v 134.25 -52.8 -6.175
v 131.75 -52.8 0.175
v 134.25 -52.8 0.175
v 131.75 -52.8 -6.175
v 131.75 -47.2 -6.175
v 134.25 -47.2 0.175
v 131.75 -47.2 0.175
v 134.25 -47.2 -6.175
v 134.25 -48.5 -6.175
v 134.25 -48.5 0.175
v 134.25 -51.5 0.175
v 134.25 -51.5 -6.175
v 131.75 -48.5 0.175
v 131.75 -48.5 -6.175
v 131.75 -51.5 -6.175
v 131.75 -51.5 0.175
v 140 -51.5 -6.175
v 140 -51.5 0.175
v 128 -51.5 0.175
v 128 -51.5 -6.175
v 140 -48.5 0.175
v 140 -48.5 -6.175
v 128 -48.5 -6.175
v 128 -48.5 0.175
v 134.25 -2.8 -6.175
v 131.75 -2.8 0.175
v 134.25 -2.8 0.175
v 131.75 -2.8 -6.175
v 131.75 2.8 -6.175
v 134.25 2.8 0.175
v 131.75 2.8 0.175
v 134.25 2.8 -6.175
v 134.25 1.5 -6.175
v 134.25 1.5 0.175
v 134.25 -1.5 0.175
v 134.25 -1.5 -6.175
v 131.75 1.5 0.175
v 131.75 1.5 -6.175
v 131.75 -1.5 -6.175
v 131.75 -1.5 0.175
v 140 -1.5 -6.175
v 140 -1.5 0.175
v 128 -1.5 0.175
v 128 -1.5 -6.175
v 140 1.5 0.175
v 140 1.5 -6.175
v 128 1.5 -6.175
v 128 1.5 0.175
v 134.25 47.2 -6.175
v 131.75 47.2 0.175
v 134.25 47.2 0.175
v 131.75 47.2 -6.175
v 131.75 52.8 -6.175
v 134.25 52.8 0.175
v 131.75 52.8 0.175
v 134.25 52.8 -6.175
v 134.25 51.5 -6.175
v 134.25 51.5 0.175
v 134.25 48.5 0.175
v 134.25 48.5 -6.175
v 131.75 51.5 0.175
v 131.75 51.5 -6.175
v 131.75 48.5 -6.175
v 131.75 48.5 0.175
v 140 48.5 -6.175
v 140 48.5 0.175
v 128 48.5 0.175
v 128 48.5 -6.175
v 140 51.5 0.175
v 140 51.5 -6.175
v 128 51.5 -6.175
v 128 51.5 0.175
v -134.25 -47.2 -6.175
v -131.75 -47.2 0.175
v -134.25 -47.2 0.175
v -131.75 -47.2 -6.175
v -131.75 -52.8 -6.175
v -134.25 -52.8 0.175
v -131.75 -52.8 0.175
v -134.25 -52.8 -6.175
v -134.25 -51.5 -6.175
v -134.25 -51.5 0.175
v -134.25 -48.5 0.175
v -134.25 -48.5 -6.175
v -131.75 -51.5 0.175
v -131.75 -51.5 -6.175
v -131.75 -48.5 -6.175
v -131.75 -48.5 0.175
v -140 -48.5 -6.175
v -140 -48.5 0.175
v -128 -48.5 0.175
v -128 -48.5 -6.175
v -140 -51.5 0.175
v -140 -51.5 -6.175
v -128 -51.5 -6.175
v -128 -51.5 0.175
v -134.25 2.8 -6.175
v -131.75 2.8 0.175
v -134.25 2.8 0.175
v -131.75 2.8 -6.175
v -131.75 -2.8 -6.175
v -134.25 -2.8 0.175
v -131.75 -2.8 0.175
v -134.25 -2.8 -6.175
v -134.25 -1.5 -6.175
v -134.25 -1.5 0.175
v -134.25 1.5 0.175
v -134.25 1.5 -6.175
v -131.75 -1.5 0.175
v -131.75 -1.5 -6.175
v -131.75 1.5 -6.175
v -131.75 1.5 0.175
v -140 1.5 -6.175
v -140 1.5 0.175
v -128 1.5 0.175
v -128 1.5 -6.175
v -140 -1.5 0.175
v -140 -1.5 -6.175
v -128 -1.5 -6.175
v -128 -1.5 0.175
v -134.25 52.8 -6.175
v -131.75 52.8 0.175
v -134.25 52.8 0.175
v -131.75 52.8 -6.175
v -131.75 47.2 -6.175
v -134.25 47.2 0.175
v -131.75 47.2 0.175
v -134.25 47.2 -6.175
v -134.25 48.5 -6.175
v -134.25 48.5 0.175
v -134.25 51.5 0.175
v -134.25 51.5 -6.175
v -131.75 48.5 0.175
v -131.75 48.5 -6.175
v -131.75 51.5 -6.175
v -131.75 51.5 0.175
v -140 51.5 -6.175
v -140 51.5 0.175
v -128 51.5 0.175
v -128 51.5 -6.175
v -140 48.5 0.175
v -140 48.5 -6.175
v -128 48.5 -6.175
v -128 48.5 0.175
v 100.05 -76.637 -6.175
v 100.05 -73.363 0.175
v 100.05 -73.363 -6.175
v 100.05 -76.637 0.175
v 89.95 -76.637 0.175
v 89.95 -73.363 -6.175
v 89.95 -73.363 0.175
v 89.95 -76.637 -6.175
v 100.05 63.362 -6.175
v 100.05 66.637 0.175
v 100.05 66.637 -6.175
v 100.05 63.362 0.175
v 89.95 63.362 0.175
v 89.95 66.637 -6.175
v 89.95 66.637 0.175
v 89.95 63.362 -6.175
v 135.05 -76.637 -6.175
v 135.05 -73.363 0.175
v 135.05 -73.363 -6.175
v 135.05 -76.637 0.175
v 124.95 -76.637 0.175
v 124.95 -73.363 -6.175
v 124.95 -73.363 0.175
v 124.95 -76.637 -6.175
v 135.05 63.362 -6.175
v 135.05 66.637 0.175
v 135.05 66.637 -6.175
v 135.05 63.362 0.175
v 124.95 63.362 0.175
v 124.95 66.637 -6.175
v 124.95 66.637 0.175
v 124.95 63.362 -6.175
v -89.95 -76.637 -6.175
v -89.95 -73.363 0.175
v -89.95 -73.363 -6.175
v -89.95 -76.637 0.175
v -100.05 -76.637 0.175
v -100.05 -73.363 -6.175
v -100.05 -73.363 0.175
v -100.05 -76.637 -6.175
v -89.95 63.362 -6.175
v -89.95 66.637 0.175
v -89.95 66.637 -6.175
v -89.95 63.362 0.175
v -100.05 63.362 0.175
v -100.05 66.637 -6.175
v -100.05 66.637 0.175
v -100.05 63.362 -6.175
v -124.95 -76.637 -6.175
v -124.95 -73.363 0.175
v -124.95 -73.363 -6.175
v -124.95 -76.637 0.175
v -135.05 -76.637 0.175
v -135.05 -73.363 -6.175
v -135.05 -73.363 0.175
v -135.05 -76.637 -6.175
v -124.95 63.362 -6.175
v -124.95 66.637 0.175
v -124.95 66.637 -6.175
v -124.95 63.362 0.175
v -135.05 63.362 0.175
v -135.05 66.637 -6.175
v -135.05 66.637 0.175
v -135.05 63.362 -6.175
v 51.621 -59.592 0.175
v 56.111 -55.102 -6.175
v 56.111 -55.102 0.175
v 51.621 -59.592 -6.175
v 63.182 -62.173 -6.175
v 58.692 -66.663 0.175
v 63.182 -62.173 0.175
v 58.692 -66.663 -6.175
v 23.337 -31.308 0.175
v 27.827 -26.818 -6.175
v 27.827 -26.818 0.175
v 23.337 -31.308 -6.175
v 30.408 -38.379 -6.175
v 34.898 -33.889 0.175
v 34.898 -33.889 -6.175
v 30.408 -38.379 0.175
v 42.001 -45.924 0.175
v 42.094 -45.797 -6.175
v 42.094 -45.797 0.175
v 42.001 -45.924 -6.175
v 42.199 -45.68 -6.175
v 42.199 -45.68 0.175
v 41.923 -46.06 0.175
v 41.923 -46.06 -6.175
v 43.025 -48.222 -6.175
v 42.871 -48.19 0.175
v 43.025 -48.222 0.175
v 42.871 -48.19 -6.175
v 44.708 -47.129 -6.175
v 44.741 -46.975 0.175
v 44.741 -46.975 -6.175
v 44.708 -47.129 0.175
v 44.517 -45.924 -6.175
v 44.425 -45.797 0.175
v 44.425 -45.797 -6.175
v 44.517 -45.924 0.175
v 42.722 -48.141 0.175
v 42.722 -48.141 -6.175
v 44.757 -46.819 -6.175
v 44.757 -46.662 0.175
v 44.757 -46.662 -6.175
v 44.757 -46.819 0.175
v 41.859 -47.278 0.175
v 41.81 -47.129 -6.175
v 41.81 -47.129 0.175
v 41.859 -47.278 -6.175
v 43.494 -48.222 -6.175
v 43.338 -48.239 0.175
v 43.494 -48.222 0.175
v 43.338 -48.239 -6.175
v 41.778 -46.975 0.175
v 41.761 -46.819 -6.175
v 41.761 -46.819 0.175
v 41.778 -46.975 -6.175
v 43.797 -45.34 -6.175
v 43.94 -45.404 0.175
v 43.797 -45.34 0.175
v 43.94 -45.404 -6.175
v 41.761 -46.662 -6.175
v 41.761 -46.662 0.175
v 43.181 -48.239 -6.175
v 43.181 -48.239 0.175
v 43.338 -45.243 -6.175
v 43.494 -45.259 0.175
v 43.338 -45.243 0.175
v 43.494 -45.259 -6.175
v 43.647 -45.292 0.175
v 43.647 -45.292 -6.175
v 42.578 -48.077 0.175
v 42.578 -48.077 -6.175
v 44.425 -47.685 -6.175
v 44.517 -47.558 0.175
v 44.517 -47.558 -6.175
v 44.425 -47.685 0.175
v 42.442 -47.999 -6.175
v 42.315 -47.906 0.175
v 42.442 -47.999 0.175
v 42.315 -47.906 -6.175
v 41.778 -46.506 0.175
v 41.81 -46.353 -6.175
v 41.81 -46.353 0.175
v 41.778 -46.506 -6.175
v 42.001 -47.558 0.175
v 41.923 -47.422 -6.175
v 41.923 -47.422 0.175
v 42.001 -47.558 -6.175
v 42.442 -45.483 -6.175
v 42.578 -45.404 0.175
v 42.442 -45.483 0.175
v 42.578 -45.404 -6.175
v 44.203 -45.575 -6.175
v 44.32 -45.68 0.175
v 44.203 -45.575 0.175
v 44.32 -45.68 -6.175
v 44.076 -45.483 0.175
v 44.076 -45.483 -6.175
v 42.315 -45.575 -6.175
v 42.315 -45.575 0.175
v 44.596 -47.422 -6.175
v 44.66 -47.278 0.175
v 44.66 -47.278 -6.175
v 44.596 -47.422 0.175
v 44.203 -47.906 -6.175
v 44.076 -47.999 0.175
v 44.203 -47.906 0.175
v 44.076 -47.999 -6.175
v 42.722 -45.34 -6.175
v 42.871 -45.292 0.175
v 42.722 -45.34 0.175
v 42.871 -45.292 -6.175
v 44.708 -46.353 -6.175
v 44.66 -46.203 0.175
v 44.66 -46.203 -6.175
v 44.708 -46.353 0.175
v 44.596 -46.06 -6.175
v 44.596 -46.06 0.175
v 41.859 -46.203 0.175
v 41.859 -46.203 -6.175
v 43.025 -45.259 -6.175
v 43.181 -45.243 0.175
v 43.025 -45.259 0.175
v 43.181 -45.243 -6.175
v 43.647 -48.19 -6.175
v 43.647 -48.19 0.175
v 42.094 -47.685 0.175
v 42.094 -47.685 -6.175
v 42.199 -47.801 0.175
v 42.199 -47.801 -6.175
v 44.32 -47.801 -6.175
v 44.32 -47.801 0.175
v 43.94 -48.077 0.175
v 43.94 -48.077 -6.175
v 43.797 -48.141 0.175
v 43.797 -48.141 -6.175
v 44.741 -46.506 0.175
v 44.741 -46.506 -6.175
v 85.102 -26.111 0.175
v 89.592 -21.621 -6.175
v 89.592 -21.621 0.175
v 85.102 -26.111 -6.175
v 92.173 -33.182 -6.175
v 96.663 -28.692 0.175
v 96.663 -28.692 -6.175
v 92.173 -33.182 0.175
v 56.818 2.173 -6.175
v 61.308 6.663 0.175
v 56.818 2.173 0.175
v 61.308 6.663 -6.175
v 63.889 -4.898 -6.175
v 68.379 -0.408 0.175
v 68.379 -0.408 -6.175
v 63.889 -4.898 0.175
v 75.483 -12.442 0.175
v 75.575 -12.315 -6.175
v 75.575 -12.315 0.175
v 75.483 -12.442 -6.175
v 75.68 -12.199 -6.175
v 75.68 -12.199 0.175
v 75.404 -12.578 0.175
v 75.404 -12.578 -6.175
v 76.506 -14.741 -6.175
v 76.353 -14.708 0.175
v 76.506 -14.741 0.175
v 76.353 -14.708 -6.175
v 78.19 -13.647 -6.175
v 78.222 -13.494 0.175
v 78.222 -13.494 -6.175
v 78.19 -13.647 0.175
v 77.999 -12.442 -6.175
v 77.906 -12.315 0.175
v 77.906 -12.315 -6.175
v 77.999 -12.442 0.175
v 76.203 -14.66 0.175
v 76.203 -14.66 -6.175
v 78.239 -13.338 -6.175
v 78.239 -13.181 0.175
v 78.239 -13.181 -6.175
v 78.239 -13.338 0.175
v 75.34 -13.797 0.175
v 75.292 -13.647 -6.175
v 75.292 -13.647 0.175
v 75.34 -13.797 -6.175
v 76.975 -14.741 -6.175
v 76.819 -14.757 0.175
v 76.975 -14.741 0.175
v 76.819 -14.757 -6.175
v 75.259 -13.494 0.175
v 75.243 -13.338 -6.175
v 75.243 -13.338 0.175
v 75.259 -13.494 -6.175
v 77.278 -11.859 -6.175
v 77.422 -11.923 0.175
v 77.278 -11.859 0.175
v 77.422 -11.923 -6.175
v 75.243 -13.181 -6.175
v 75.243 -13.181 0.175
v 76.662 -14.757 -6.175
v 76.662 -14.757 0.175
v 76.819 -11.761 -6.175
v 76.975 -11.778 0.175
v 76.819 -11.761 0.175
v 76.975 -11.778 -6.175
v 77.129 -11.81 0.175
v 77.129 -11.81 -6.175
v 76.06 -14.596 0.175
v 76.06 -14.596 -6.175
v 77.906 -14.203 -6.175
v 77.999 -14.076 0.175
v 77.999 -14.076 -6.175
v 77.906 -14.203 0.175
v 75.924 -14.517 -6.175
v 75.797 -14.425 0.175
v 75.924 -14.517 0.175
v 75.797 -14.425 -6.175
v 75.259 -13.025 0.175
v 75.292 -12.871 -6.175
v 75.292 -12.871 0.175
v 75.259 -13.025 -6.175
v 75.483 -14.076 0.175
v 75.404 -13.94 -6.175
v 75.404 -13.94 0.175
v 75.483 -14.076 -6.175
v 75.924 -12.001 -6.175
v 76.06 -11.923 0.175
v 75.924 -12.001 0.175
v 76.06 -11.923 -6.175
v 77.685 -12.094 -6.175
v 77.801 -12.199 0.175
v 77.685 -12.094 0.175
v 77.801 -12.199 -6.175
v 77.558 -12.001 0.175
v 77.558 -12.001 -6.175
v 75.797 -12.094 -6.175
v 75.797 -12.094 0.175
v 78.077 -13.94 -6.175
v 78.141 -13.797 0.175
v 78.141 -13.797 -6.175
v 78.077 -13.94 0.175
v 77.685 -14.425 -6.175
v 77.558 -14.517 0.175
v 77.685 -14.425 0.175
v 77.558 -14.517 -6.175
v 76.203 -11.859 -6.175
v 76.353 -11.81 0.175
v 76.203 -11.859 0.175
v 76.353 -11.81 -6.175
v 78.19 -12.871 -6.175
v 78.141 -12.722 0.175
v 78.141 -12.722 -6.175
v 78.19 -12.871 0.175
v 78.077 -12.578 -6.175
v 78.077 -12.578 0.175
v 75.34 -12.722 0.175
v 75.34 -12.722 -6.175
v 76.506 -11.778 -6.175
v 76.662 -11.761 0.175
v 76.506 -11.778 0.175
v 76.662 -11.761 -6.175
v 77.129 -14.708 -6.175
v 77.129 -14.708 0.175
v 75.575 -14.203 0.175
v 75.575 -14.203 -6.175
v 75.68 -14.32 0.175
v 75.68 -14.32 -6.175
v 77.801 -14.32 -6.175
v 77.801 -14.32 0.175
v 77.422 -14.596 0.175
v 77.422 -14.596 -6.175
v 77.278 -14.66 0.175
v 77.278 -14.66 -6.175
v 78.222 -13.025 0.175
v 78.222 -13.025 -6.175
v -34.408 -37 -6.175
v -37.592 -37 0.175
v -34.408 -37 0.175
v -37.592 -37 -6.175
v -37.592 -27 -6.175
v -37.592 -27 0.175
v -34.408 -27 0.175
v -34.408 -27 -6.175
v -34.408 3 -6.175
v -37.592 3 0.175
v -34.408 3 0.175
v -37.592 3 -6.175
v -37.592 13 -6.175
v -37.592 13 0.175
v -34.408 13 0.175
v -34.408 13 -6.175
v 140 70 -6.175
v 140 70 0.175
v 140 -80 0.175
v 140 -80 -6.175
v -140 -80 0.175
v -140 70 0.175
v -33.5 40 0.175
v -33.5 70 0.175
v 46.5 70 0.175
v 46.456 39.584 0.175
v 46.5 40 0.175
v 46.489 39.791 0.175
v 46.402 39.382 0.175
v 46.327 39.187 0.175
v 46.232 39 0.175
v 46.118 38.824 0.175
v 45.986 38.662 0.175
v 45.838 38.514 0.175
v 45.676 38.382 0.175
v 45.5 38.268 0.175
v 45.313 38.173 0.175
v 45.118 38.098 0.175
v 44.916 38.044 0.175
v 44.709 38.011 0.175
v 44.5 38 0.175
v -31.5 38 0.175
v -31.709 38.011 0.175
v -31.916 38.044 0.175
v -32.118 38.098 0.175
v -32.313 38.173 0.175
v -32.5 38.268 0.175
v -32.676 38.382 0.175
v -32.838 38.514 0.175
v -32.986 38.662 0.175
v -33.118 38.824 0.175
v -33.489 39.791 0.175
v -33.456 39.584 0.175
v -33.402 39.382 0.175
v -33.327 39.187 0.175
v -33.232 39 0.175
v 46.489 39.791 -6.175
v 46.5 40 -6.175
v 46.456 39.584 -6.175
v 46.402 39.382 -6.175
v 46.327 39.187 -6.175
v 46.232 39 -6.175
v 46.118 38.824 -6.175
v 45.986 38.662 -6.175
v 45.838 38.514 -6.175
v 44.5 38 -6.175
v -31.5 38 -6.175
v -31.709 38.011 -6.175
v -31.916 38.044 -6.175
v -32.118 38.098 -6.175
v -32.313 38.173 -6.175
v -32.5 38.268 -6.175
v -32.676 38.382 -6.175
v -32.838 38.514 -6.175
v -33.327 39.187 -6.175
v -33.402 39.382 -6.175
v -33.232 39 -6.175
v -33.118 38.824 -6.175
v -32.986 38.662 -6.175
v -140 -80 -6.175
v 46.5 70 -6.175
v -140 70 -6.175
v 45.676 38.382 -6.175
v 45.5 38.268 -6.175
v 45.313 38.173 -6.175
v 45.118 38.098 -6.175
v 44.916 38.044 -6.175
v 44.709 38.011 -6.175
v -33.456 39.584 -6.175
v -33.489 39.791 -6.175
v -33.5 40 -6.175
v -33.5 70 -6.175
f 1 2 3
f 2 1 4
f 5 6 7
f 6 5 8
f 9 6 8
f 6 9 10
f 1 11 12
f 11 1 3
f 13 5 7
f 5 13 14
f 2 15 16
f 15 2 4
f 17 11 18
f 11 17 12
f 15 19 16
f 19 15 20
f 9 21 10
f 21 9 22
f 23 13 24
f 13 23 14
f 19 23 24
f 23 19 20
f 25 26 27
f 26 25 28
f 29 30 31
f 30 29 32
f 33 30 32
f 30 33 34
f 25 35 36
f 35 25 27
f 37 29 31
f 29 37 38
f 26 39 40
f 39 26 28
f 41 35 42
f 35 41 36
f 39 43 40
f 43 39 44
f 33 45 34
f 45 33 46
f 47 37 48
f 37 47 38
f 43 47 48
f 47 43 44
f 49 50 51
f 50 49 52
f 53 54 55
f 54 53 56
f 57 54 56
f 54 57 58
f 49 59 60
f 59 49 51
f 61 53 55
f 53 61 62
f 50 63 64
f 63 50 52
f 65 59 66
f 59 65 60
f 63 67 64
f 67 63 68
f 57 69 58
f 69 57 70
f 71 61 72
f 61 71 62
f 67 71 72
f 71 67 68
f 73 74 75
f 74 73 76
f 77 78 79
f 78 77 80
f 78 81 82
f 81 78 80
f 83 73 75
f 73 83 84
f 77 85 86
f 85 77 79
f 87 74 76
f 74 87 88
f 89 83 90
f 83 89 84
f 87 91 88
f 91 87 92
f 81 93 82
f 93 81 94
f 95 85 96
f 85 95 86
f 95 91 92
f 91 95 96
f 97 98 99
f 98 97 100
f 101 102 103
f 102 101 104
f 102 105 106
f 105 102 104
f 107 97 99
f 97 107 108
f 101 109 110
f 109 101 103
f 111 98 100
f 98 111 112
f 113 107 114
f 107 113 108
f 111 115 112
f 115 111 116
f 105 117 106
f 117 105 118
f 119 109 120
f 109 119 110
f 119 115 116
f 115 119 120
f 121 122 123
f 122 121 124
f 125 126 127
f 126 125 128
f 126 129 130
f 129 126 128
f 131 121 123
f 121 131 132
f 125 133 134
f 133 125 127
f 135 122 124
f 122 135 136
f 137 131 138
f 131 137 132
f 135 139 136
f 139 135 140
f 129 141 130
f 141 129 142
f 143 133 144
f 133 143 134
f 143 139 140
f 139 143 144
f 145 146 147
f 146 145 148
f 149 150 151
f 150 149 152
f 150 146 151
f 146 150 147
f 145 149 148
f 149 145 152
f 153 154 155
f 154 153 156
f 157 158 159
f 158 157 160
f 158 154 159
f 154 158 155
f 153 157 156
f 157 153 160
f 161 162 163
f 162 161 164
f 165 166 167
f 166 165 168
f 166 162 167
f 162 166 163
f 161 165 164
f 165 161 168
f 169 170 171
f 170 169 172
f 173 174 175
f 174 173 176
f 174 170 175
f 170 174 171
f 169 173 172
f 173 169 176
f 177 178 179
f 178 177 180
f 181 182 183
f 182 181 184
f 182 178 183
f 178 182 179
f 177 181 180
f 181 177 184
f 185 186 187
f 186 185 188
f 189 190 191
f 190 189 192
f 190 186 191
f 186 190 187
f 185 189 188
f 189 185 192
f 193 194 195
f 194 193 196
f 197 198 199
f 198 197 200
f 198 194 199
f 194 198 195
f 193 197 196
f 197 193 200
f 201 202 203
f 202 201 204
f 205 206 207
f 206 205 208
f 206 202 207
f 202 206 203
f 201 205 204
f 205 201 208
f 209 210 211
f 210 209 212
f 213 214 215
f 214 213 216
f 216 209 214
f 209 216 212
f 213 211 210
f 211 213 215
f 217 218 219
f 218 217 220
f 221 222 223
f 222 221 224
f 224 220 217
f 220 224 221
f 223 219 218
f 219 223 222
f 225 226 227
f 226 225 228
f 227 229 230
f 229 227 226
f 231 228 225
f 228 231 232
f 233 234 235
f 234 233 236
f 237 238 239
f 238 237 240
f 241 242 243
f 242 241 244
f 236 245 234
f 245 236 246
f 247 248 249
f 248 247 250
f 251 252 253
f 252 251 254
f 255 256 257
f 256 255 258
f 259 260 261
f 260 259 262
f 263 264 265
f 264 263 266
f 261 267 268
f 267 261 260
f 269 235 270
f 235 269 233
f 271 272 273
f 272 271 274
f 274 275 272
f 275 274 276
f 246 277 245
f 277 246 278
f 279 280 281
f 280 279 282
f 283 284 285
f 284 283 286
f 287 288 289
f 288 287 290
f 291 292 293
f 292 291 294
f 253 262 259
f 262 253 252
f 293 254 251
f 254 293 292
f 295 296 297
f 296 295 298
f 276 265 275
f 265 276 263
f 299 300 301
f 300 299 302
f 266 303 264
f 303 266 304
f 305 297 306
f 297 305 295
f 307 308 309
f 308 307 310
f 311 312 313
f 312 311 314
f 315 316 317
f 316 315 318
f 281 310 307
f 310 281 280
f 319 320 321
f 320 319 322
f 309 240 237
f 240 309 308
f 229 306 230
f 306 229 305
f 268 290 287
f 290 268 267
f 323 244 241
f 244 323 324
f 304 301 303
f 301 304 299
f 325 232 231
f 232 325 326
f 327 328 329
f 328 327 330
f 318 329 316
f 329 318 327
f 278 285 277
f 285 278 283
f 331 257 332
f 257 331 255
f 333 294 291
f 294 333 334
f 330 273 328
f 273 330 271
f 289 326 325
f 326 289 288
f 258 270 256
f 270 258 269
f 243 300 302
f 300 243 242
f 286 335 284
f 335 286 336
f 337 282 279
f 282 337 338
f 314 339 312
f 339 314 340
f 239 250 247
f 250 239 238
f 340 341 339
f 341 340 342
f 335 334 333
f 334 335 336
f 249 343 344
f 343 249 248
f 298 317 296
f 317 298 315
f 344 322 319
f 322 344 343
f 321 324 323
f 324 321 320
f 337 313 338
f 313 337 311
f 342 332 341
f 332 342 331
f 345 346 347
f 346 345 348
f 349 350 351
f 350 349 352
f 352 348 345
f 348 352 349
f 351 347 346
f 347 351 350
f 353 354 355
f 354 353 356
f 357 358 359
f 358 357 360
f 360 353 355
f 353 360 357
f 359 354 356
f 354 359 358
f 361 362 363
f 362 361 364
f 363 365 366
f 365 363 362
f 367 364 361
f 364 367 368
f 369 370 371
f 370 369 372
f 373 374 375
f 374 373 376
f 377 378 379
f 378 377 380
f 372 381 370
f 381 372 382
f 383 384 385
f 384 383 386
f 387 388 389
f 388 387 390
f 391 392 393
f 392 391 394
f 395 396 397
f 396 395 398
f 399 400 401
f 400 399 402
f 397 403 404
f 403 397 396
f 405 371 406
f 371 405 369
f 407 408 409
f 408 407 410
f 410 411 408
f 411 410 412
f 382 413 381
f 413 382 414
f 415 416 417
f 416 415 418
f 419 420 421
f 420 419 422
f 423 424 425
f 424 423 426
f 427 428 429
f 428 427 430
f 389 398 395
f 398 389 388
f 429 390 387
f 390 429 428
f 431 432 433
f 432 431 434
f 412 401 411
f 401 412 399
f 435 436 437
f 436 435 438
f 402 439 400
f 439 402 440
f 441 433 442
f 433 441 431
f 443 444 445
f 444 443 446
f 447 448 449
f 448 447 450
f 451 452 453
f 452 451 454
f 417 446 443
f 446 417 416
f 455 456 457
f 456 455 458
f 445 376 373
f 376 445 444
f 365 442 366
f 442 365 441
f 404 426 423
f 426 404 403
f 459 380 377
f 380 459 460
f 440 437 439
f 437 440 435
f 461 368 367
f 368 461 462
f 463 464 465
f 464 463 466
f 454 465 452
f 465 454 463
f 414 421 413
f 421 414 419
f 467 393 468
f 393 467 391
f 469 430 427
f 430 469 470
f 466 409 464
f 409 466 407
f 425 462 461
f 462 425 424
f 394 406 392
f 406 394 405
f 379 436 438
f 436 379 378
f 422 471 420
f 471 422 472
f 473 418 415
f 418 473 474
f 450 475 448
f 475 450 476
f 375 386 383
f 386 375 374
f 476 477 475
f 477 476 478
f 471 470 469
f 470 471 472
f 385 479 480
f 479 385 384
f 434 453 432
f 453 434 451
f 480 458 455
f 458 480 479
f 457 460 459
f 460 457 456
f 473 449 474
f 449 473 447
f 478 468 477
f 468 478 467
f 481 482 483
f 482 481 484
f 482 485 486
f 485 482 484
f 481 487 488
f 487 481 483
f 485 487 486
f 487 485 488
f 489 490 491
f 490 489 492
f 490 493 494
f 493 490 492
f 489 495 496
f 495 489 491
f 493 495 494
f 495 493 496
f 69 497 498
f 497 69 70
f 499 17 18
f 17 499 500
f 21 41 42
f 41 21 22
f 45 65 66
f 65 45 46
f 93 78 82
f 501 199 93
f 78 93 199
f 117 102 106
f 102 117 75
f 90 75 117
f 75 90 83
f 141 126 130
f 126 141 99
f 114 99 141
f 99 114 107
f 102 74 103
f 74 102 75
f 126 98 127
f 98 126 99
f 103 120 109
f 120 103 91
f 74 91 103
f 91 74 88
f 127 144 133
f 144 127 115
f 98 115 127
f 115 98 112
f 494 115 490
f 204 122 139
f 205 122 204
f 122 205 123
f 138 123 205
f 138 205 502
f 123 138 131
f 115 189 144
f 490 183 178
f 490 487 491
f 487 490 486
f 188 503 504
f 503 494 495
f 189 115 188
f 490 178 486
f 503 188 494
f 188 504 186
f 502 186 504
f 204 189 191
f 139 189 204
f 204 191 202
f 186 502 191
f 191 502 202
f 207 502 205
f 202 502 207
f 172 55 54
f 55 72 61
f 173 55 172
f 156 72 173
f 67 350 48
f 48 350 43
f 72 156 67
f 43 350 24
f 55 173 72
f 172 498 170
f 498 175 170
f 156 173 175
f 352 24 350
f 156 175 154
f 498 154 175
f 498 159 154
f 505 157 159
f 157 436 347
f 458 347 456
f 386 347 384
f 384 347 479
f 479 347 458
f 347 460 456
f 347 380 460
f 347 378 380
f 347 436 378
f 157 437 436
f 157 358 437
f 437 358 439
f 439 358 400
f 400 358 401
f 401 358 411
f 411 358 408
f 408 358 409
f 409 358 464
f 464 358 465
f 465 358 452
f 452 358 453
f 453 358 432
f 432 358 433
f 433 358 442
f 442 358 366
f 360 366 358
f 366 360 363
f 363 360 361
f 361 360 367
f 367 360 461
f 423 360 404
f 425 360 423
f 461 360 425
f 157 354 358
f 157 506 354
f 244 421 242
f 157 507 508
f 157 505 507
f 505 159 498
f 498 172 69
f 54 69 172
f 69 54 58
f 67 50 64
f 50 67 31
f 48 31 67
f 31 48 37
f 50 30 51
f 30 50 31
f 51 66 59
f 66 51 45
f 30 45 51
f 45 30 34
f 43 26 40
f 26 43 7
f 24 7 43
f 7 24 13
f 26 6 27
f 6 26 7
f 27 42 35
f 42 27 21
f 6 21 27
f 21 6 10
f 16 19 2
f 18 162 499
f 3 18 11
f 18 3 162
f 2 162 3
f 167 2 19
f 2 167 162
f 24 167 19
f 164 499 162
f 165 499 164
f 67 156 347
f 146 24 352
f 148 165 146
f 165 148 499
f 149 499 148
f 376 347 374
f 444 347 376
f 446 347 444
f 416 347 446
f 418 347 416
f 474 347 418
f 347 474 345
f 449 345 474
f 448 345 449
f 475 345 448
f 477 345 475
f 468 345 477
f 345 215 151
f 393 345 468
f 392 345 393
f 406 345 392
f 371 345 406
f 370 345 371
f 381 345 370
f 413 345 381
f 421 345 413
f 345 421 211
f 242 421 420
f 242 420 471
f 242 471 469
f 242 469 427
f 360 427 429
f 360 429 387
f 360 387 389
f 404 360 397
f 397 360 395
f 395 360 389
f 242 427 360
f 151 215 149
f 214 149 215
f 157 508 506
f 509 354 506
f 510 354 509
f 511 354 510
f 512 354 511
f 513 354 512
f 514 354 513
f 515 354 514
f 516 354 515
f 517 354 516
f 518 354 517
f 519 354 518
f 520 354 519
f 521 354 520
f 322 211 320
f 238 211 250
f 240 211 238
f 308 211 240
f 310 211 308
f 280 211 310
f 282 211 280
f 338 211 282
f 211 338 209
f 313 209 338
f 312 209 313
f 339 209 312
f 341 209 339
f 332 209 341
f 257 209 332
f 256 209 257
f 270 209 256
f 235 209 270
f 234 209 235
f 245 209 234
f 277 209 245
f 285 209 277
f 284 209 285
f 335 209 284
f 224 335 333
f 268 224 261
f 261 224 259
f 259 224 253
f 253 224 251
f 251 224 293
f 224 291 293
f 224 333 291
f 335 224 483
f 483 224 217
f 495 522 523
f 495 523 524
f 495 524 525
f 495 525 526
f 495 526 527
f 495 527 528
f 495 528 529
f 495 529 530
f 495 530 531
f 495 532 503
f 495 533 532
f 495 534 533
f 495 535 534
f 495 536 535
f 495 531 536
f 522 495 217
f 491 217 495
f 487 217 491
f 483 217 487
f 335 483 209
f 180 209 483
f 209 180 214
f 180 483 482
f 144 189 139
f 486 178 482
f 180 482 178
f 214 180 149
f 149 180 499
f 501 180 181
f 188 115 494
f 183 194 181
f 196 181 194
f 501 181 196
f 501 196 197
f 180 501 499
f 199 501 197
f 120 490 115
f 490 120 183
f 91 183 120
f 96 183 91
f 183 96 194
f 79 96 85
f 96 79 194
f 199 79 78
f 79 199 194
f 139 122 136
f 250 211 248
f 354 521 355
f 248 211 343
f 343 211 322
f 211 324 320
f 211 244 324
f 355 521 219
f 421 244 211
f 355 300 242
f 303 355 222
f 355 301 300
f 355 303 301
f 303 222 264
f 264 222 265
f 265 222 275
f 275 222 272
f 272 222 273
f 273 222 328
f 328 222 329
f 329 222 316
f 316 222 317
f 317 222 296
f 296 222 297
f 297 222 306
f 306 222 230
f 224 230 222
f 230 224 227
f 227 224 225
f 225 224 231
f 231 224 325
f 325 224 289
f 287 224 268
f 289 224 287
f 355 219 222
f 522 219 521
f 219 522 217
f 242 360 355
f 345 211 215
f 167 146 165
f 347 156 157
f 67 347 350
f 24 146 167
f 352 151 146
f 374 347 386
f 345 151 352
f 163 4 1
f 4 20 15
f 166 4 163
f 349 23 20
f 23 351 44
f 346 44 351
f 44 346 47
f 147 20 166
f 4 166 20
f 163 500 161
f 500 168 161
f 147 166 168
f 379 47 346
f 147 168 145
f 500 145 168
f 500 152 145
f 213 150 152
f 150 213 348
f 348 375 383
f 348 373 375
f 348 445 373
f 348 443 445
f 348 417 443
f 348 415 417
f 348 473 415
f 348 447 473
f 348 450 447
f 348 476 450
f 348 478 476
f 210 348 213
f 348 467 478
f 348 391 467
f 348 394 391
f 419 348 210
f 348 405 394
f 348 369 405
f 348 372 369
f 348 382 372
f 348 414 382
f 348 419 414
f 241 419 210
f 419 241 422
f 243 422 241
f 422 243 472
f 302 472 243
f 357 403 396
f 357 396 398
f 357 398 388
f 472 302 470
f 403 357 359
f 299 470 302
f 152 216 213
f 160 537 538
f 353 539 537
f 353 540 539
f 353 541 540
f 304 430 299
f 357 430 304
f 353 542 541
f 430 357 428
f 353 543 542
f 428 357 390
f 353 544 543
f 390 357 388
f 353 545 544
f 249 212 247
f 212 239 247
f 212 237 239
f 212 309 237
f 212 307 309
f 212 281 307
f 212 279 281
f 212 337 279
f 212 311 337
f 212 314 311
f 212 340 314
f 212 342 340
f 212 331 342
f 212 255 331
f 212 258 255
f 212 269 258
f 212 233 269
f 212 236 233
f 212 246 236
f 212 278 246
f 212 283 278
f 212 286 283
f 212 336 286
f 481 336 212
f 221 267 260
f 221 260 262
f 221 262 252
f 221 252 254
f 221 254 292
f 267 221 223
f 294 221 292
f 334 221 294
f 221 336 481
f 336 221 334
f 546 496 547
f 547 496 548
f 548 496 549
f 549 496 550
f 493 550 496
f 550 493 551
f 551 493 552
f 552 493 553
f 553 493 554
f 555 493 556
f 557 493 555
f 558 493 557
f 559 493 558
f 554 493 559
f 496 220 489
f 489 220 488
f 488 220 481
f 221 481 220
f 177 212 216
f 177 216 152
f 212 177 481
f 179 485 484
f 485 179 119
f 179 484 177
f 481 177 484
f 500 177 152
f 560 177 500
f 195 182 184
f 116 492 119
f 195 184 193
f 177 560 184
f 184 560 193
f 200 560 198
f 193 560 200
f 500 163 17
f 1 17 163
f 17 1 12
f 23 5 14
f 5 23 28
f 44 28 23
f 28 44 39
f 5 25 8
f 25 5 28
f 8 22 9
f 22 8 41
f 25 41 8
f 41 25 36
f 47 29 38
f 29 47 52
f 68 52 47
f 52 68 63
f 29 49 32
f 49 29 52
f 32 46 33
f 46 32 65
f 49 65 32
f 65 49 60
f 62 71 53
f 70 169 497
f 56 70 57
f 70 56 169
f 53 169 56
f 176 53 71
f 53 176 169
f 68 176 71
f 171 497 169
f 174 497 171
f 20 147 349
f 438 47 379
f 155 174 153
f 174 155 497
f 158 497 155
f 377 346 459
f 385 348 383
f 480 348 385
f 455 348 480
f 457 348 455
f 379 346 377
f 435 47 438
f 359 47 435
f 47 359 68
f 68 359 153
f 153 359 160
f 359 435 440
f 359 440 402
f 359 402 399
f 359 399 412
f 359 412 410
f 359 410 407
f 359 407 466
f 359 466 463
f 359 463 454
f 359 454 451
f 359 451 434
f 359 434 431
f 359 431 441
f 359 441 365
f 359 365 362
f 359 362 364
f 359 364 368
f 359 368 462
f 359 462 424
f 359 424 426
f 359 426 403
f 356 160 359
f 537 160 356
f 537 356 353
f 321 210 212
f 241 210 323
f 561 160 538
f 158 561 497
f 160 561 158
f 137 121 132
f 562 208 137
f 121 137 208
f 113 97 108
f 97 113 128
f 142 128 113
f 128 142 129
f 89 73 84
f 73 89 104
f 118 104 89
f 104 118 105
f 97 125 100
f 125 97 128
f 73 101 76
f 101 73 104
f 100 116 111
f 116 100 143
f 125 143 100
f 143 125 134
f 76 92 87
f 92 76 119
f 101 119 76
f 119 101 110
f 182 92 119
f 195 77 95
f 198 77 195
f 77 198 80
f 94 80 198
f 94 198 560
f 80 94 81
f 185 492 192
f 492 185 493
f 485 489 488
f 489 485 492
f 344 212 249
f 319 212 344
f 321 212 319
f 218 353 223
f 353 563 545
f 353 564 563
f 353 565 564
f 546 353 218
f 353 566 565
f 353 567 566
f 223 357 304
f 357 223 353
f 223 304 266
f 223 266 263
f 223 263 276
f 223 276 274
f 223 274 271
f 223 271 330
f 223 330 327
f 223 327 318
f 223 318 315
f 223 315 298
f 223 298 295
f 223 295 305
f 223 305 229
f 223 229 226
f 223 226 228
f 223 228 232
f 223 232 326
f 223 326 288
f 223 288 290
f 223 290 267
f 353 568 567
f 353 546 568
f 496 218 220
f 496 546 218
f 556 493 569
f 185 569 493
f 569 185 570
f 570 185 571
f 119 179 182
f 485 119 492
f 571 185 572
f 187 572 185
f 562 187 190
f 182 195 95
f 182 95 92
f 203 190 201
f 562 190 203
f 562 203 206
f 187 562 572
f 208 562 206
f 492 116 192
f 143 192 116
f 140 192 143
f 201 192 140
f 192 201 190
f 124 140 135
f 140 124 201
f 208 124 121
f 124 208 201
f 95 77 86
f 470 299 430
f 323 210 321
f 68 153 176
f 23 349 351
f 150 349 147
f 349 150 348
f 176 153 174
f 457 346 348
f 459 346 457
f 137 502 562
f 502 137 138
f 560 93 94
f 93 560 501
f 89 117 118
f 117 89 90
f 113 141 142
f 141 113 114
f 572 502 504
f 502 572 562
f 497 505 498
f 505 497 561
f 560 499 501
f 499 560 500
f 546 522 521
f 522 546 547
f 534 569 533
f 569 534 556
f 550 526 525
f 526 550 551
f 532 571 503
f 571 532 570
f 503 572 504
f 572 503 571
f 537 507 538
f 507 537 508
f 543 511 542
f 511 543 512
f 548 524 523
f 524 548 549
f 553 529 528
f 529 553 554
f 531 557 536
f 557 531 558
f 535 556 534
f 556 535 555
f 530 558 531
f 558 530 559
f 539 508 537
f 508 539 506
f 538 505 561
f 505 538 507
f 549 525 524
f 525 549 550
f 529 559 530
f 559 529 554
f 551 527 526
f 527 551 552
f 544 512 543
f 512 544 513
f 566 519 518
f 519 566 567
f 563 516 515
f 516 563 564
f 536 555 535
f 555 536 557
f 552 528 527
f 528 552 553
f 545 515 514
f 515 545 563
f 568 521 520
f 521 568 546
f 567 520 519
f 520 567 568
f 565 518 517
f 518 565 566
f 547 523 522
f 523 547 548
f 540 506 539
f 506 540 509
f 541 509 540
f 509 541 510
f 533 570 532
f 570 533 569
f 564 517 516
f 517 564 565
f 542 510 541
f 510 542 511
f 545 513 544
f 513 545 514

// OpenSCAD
// file: side.scad
include <parts.scad>

projection(cut=true) side(side=side);

module side(side="left"){
    difference(){
        cube([internal_height, 380+main_thickness*2, main_thickness], center=true);
        for(Y=[-1,1]) translate([0,((380+main_thickness)/2)*Y,0]) tab(length=20, width=main_thickness+0.01, thickness=main_thickness+0.01);
        for(Y=[70,120,170]) translate([7,Y,0]) cylinder(d=3, h=20, center=true, $fn=60);
        for(Y=[185,45]) translate([22.5,Y,0]) cube([10,top_thickness+0.1,main_thickness+0.1], center=true);
        if(side=="left"){
            translate([-20,-175,-(main_thickness/2)-0.1]) scale([0.75,0.8,1]) scale_av();
        }
        else{
            for(Y=[-45,-15,45]) translate([-1,118+Y,0,]) cylinder(d=3, h=main_thickness+0.1, center=true, $fn=60);
            translate([-20,38,-(main_thickness/2)-0.1]) scale([0.75,0.8,1]) mirror([0,1,0]) scale_av();
        }
        for(O=[0:12:110]) translate([28,175-O,0]) hull(){
            cylinder(d=6, h=main_thickness+0.1, center=true, $fn=60);
            translate([-10,-10,0]) cylinder(d=6, h=main_thickness+0.1, center=true, $fn=60);
        }
        if( front_panel_thickness != main_thickness){
            translate([0, 5+(380/2)+front_panel_thickness, 0]) cube([internal_width+0.001, 10, main_thickness+0.001], center=true);
        }
    }
    for(Y=[-1,0,1]) translate([-((internal_height+top_thickness)/2),120*Y,0])
        tab(length=top_thickness+0.1, width=tab_width+0.1, thickness=main_thickness+0.1);
    for(Y=[-1,0,1]) translate([((internal_height+main_thickness)/2),120*Y,0]) tab();
}
// file: front.scad
include <parts.scad>

front();

module front(type="exp"){
    drill_hole=2.28;
    difference(){
        back_base(thickness=front_panel_thickness);
//        for(Y=[0:1:3]) translate([22.5, -20.5+Y*28,0]) cylinder(d=6, h=40, center=true, $fn=60);
        for(Y=[0:1:3]) translate([20, -22.5+Y*29,0]) cylinder(d=6, h=40, center=true, $fn=60);
        hull() for(X=[-5,5]) translate([22.5+X, -123.5,0]) cylinder(d=5, h=40, center=true, $fn=60);
        //hull() for(X=[-7,7], Y=[-124, -57]) translate([-5.5+X, Y,0]) cylinder(d=5, h=40, center=true, $fn=60);
        //hull() for(X=[-12.5,7], Y=[-124, -39.5]) translate([-5.5+X, Y,0]) cylinder(d=5, h=40, center=true, $fn=60);
        hull() for(X=[-12.5,7], Y=[-124, -39.5]) translate([-5.5+X, Y-3,0]) cylinder(d=5, h=40, center=true, $fn=60);
        for(Y=[-20,7]) translate([-1,Y,0]) union(){
            cylinder(d=24, h=front_panel_thickness+0.1, center=true, $fn=60);
            translate([12,-9.5,0]) rotate([0,0,0]) cylinder(d=drill_hole, h=front_panel_thickness+0.1, center=true, $fn=60);
            translate([-12,9.5,0]) rotate([0,0,0]) cylinder(d=drill_hole, h=front_panel_thickness+0.1, center=true, $fn=60);
        }
        translate([-5,34,0]) union(){
            cylinder(d=24, h=front_panel_thickness+0.1, center=true, $fn=60);
//            cube([17.5,16,front_panel_thickness+0.1], center=true);
            translate([12,-9.5,0]) rotate([0,0,0]) cylinder(d=drill_hole, h=front_panel_thickness+0.1, center=true, $fn=60);
            translate([-12,9.5,0]) rotate([0,0,0]) cylinder(d=drill_hole, h=front_panel_thickness+0.1, center=true, $fn=60);
        }
        // screen mount
        translate([0,0-7,0]){
            translate([-2.25,121.75,0]) cylinder(d=1.6, h=front_panel_thickness+0.1, center=true, $fn=60);
            translate([-27.75,58.3,0]) cylinder(d=1.6, h=front_panel_thickness+0.1, center=true, $fn=60);
            translate([-11,119,0]) cylinder(d=10, h=front_panel_thickness+0.1, center=true, $fn=60);
        }
        translate([-25,130,0]) cylinder(d=12, h=front_panel_thickness+0.1, center=true, $fn=60);
        for(Y=[29,-65,-105]) translate([-29.2,Y,0]) hdmi_cutout(thickness=main_thickness+0.2);
        translate([-25.5,-10,0]) usb_cutout(thickness=main_thickness+0.2);
        if(type=="exp"){
            translate([-7,130,0])  cylinder(d=12, h=front_panel_thickness+0.1, center=true, $fn=60);
            translate([-28,-130,0])  cylinder(d=12, h=front_panel_thickness+0.1, center=true, $fn=60);
        }
        else{
            translate([-5,132,0])  cylinder(d=8, h=front_panel_thickness+0.1, center=true, $fn=60);
            translate([-28,-132,0])  cylinder(d=8, h=front_panel_thickness+0.1, center=true, $fn=60);
        }
    }
}
// file: sata_mount.scad
//sata_mount();
//xlr_635();

module sata_mount(safe_area=true){
    difference(){
        cube([102, 120.5, 25.4]);
        translate([20,-0.01,0.8]) cube([70, 6, 16.25]);
        translate([3,-0.1,14.8]) cube([14, 1.5, 7.8]);
        for(X=[-0.1,97.1], Y=[24.5, 84.15, 114.5]) translate([X,Y,4.35]) rotate([0,90,0]) cylinder(d=2.5, h=5, $fn=60);
        
        for(X=[3.5,102-3.5], Y=[35.5, 104.5]) translate([X,Y,-0.1]) cylinder(d=2.5, h=5, $fn=60);
            
        difference(){
            translate([3,-0.1,1.5]) cube([14.3, 1.5, 9.5]);
            translate([3.15,-0.1,1.6]) cube([14, 1.5, 9.3]);
        }
    }
    translate([3.1,-1.5,14.95]) cube([12, 1.5, 7.5]);
    if(safe_area){
        color("green"){
            translate([35,120,11]) cube([43, 20, 8]);
        }
    }
}

module xlr_635(tsafe_area=true){
    difference(){
        union(){
            xlr_plate();
            translate([0,-4,0]) rotate([90,0,0]) cylinder(d=24, h=5.75, center=true, $fn=60);
            color("red"){
                translate([0,-6,10]) cube([4.5,3,8.75], center=true);
                translate([0,-6,14]) cube([11.25,3,3.6], center=true);
            }
            translate([0,11,0]) rotate([90,0,0]) cylinder(d=22, h=20, center=true, $fn=60);
            for(R=[0,90,180]) rotate([0,R,0]) translate([6,23,0]) rotate([90,0,0]) cylinder(d=3, h=6, center=true, $fn=60);
        }
        translate([0,-5,0]) rotate([90,0,0]) cylinder(d=6.7, h=10, center=true, $fn=60);
    }
    if(tsafe_area){
        color("green"){
//            translate([0,25+6.5,0]) cube([11.8, 13, 8.5], center=true);
            translate([0,35,0]) rotate([90,0,0]) cylinder(d=5, h=20, center=true, $fn=60);
        }
    }
}

module xlr_cat6(tsafe_area=true){
    difference(){
        union(){
            xlr_plate();
            translate([0,12.5,0]) cube([15,25,16.6], center=true);
        }
        translate([0,-0.1,0]) cube([12,5,7], center=true);
        translate([0,-0.1,4.2]) cube([6.3,5,1.75], center=true);
        translate([0,-0.1,5.7]) cube([4,5,1.3], center=true);
    }
    if(tsafe_area){
        color("green"){
            translate([0,25+6.5,0]) cube([11.8, 13, 8.5], center=true);
            translate([0,25+13,0]) rotate([90,0,0]) cylinder(d=5, h=20, center=true, $fn=60);
        }
    }
}

module xlr_plate(){
//    %cube([26, 1, 31], center=true);
    difference(){
        hull() for(X=[-1,1], Z=[-1,1]) translate([10.5*X,0,13*Z]) rotate([90,0,0]) cylinder(d=5, h=2.3, center=true, $fn=60);
        translate([-9.5,0,12]) rotate([90,0,0]) cylinder(d=3, h=3, center=true, $fn=60);
        translate([9.5,0,-12]) rotate([90,0,0]) cylinder(d=3, h=3, center=true, $fn=60);
    }
}
// file: motherboard.scad
//motherboard();

module motherboard(safe_area=true){
    
    translate([0,0,8]) base_baord();
    translate([5,-85+10,10.15]) cube([55, 15, 35]); // power board
    translate([-55,-60,10.15]) color("red") cube([140, 15, 35]); // RAM
    translate([-75,55,10.15]) color("silver") cube([150, 30, 30]); //rough connectors
    
    translate([20,3,10.15]){
        cylinder(d=94, h=53, $fn=60);
        for(X=[-1,1], Y=[-1,1]) ;
    }
    if(safe_area){
        %translate([5,-95,10.15]) cube([55, 20, 35]); // power cables
        %translate([-70,85,10.15]) cube([155, 60, 30]); //rough connectors
    }
}

module base_baord(){
    // 85
    translate([0,0,1])
    difference(){
        cube([170,170,2], center=true);
//        for(X=[-1,1], Y=[,1,1,1]) translate([78.65*X, Y,0]) cylinder(d=3.96, h=4, center=true, $fn=60);
        translate([-78.65, 77.47,0]) cylinder(d=3.96, h=4, center=true, $fn=60);
        translate([78.65, 55,0]) cylinder(d=3.96, h=4, center=true, $fn=60);
        translate([78.65, -77.43,0]) cylinder(d=3.96, h=4, center=true, $fn=60);
        translate([-78.65, -77.43,0]) cylinder(d=3.96, h=4, center=true, $fn=60);
    }
    
}
// file: tesmart.scad
//TESmart();
//hdmi_panelmount();

module TESmart(safe_area=true){
//    color([0.4,0.4,0.4]) 
    difference(){
        cube([277, 136, 25], center=true);
        for(X=[-1,1], Y=[-1,1]) translate([(277.1/2)*X, 38*Y, -8.2]) rotate([0,90,0]) cylinder(d=5, h=1, $fn=60);
    }
    // rs-232 part
    color("silver") translate([138.5-26,-136/2,0]){
        for(X=[-1,1]) translate([(24.5/2)*X, 0,0]) rotate([90,0,0]) cylinder(d=5, h=4.8, $fn=6);
        hull(){
            for(X=[-1,1]) translate([(14.4/2)*X, 0,2]) rotate([90,0,0]) cylinder(d=2, h=4.8, $fn=60);
            for(X=[-1,1]) translate([(12.8/2)*X, 0,-2]) rotate([90,0,0]) cylinder(d=2, h=4.8, $fn=60);
        }
    }
    // switch
    color([0.4,0.4,0.4]) translate([-138.5+15,138/2,0])cube([11, 2.2, 15], center=true);
    // Buttones
    color([0.4,0.4,0.4]) for(X=[0:1:3]) translate([138.5-75-(X*28), (136/2)+4.8,0]) rotate([90,0,0]) cylinder(d=6, h=4.8, $fn=60);
    if(safe_area){
        color("green"){
            for(X=[0:1:7]) translate([-138.5+45-2.5+(X*24.5),-136/2,0]) hdmi_plug();
//            translate([-138.5,(-136/2)-5,-5]) %cube([35,10,10]);
//            translate([-138.5+35+15,(-136/2)-5,-5]) %cube([10,10,10]);
            translate([-138.5+23,-(136/2),0]){
                rotate([90,0,0]) cylinder(d=8.76, h=15, $fn=60);
                translate([0,-15,0]) rotate([90,0,0]) cylinder(d=6.76, h=15, $fn=60);
            }
        }
    }
}

module hdmi_plug(){
    translate([0,-19,0]) cube([20,38,9.35], center=true);
    translate([0,-38,0]) rotate([90,0,0]) cylinder(d=6, h=4.8, $fn=60);
}


module hdmi_panelmount(){
    difference(){
        hull() for(X=[-1,1]) translate([(26.5/2)*X, 0,0]) rotate([90,0,0]) cylinder(d=10.6, h=7.2, $fn=60);
        for(X=[-1,1]) translate([(26.5/2)*X,-2.5,0]) rotate([90,0,0]) cylinder(d=3, h=5, $fn=60);
    }
    translate([0,-7.1,1.25]) hull(){
        for(X=[-1,1], Z=[-1,1]) translate([(15.5/2)*X,0,1.8*Z]) rotate([90,0,0]) cylinder(d=2, h=4.35, $fn=60);
        for(X=[-1,1]) translate([(11/2)*X,0,-4.2]) rotate([90,0,0]) cylinder(d=2, h=4.35, $fn=60);
    }
    hull(){
        cube([20.5,1,10.6], center=true);
        for(X=[-1,1]) translate([(16.5/2)*X,22,0]) rotate([0,0,0]) cylinder(d=4, h=10.6, center=true, $fn=60);
    }
    translate([0,24+9,0]) rotate([90,0,0]) cylinder(d1=8.5, d2=8, h=9, $fn=60);
}

module dual_usb_panelmount(safe_zone=false){
    translate([0,7.6,0]){
        difference(){
            hull() for(X=[-1,1]) translate([15.5*X, 0,0]) rotate([90,0,0]) cylinder(d=10, h=7.6, $fn=60);
            for(X=[-1,1]) translate([15.5*X,1,0]) rotate([90,0,0]) cylinder(d=3, h=10, $fn=60);
        }
        translate([0,-3.1,0]) cube([24,9,16.5], center=true);
        translate([0,11,0]) cube([24,20,18.5], center=true);
        
        hull() for(X=[-1,1]) translate([2.5*X, 25,0]) rotate([90,0,0]) cylinder(d=10.5, h=4.3, $fn=60);
        for(X=[-1,1]) translate([2.2*X, 35,0]) rotate([90,0,0]) cylinder(d=4.2, h=10, $fn=60);
        if( safe_zone ){
            #translate([0,-16.6,0]) cube([18.5,18.5,18.5], center=true);
        }
    }
}
//single_usb_panelmount();
module single_usb_panelmount(safe_zone=true){
    translate([0,7.6,0]){
        difference(){
            hull() for(X=[-1,1]) translate([15.5*X, 0,0]) rotate([90,0,0]) cylinder(d=10, h=7.6, $fn=60);
            for(X=[-1,1]) translate([15.5*X,1,0]) rotate([90,0,0]) cylinder(d=3, h=10, $fn=60);
        }
        translate([0,-3.1,0]) cube([24,9,12], center=true);
        
        hull() for(X=[-1,1]) translate([2.5*X, 25,0]) rotate([90,0,0]) cylinder(d=10.5, h=4.3, $fn=60);
        for(X=[-1,1]) translate([2.2*X, 35,0]) rotate([90,0,0]) cylinder(d=4.2, h=10, $fn=60);
        
        #translate([0,-16.6,0]) cube([18.5,18.5,9], center=true);
    }
}


module usb_capture(safe=true){
    hull() for(X=[-1,1], Y=[-1,1])
        translate([(20-3)*X, (46-3)*Y,0]) 
            cylinder(d=6, h=12, center=true, $fn=60);
    if(safe){
        translate([0,-46,0]) mirror([0,0,0]) %hdmi_plug();
        translate([0,46,0]) mirror([0,1,0]) %hdmi_plug();
    }
}

 
// main file
include<parts.scad>

mount_plate();

module mount_plate(){
    difference(){
        translate([0,-5,-3]) cube([280, 150, main_thickness], center=true); // Divider/mount
        for(X=[-1,1], Y=[-1,0,1]) translate([-133*X,50*Y,0-3]) rotate([0,0,90*X]) nut_cutout();

//        translate([6.5,41+20,-3]) cube([80,20,6.5], center=true);
        translate([6.5,0,-3]) hull(){
            for(X=[-1,1]) translate([38*X,40,0]) cylinder(d=4, h=6.5, center=true, $fn=60);
            translate([0,71,0]) cube([80,1,6.5], center=true);
        }
        for(X=[95,130, -95, -130], Y=[-75, 65]) translate([X,Y,-(main_thickness/2)+0.2]) tab(width=top_thickness+0.1, length=10+0.1);

        //cylinder(d=3, h=15, center=true, $fn=60);
        translate([60,-30,-(main_thickness/2)+0.2]) rotate([0,0,45]){
            for(X=[-1,1]) translate([(20+(main_thickness/2)+.5)*X,0,0]) rotate([0,0,90]) usb_mount_cutout();
        }

        // SATA mount cutout
        for(Y=[-10,30]) translate([-36,Y-22,-(main_thickness/2)]) rotate([0,0,90]) tab(length=10, width=top_thickness+0.01, thickness=main_thickness+0.5);
    }
}
